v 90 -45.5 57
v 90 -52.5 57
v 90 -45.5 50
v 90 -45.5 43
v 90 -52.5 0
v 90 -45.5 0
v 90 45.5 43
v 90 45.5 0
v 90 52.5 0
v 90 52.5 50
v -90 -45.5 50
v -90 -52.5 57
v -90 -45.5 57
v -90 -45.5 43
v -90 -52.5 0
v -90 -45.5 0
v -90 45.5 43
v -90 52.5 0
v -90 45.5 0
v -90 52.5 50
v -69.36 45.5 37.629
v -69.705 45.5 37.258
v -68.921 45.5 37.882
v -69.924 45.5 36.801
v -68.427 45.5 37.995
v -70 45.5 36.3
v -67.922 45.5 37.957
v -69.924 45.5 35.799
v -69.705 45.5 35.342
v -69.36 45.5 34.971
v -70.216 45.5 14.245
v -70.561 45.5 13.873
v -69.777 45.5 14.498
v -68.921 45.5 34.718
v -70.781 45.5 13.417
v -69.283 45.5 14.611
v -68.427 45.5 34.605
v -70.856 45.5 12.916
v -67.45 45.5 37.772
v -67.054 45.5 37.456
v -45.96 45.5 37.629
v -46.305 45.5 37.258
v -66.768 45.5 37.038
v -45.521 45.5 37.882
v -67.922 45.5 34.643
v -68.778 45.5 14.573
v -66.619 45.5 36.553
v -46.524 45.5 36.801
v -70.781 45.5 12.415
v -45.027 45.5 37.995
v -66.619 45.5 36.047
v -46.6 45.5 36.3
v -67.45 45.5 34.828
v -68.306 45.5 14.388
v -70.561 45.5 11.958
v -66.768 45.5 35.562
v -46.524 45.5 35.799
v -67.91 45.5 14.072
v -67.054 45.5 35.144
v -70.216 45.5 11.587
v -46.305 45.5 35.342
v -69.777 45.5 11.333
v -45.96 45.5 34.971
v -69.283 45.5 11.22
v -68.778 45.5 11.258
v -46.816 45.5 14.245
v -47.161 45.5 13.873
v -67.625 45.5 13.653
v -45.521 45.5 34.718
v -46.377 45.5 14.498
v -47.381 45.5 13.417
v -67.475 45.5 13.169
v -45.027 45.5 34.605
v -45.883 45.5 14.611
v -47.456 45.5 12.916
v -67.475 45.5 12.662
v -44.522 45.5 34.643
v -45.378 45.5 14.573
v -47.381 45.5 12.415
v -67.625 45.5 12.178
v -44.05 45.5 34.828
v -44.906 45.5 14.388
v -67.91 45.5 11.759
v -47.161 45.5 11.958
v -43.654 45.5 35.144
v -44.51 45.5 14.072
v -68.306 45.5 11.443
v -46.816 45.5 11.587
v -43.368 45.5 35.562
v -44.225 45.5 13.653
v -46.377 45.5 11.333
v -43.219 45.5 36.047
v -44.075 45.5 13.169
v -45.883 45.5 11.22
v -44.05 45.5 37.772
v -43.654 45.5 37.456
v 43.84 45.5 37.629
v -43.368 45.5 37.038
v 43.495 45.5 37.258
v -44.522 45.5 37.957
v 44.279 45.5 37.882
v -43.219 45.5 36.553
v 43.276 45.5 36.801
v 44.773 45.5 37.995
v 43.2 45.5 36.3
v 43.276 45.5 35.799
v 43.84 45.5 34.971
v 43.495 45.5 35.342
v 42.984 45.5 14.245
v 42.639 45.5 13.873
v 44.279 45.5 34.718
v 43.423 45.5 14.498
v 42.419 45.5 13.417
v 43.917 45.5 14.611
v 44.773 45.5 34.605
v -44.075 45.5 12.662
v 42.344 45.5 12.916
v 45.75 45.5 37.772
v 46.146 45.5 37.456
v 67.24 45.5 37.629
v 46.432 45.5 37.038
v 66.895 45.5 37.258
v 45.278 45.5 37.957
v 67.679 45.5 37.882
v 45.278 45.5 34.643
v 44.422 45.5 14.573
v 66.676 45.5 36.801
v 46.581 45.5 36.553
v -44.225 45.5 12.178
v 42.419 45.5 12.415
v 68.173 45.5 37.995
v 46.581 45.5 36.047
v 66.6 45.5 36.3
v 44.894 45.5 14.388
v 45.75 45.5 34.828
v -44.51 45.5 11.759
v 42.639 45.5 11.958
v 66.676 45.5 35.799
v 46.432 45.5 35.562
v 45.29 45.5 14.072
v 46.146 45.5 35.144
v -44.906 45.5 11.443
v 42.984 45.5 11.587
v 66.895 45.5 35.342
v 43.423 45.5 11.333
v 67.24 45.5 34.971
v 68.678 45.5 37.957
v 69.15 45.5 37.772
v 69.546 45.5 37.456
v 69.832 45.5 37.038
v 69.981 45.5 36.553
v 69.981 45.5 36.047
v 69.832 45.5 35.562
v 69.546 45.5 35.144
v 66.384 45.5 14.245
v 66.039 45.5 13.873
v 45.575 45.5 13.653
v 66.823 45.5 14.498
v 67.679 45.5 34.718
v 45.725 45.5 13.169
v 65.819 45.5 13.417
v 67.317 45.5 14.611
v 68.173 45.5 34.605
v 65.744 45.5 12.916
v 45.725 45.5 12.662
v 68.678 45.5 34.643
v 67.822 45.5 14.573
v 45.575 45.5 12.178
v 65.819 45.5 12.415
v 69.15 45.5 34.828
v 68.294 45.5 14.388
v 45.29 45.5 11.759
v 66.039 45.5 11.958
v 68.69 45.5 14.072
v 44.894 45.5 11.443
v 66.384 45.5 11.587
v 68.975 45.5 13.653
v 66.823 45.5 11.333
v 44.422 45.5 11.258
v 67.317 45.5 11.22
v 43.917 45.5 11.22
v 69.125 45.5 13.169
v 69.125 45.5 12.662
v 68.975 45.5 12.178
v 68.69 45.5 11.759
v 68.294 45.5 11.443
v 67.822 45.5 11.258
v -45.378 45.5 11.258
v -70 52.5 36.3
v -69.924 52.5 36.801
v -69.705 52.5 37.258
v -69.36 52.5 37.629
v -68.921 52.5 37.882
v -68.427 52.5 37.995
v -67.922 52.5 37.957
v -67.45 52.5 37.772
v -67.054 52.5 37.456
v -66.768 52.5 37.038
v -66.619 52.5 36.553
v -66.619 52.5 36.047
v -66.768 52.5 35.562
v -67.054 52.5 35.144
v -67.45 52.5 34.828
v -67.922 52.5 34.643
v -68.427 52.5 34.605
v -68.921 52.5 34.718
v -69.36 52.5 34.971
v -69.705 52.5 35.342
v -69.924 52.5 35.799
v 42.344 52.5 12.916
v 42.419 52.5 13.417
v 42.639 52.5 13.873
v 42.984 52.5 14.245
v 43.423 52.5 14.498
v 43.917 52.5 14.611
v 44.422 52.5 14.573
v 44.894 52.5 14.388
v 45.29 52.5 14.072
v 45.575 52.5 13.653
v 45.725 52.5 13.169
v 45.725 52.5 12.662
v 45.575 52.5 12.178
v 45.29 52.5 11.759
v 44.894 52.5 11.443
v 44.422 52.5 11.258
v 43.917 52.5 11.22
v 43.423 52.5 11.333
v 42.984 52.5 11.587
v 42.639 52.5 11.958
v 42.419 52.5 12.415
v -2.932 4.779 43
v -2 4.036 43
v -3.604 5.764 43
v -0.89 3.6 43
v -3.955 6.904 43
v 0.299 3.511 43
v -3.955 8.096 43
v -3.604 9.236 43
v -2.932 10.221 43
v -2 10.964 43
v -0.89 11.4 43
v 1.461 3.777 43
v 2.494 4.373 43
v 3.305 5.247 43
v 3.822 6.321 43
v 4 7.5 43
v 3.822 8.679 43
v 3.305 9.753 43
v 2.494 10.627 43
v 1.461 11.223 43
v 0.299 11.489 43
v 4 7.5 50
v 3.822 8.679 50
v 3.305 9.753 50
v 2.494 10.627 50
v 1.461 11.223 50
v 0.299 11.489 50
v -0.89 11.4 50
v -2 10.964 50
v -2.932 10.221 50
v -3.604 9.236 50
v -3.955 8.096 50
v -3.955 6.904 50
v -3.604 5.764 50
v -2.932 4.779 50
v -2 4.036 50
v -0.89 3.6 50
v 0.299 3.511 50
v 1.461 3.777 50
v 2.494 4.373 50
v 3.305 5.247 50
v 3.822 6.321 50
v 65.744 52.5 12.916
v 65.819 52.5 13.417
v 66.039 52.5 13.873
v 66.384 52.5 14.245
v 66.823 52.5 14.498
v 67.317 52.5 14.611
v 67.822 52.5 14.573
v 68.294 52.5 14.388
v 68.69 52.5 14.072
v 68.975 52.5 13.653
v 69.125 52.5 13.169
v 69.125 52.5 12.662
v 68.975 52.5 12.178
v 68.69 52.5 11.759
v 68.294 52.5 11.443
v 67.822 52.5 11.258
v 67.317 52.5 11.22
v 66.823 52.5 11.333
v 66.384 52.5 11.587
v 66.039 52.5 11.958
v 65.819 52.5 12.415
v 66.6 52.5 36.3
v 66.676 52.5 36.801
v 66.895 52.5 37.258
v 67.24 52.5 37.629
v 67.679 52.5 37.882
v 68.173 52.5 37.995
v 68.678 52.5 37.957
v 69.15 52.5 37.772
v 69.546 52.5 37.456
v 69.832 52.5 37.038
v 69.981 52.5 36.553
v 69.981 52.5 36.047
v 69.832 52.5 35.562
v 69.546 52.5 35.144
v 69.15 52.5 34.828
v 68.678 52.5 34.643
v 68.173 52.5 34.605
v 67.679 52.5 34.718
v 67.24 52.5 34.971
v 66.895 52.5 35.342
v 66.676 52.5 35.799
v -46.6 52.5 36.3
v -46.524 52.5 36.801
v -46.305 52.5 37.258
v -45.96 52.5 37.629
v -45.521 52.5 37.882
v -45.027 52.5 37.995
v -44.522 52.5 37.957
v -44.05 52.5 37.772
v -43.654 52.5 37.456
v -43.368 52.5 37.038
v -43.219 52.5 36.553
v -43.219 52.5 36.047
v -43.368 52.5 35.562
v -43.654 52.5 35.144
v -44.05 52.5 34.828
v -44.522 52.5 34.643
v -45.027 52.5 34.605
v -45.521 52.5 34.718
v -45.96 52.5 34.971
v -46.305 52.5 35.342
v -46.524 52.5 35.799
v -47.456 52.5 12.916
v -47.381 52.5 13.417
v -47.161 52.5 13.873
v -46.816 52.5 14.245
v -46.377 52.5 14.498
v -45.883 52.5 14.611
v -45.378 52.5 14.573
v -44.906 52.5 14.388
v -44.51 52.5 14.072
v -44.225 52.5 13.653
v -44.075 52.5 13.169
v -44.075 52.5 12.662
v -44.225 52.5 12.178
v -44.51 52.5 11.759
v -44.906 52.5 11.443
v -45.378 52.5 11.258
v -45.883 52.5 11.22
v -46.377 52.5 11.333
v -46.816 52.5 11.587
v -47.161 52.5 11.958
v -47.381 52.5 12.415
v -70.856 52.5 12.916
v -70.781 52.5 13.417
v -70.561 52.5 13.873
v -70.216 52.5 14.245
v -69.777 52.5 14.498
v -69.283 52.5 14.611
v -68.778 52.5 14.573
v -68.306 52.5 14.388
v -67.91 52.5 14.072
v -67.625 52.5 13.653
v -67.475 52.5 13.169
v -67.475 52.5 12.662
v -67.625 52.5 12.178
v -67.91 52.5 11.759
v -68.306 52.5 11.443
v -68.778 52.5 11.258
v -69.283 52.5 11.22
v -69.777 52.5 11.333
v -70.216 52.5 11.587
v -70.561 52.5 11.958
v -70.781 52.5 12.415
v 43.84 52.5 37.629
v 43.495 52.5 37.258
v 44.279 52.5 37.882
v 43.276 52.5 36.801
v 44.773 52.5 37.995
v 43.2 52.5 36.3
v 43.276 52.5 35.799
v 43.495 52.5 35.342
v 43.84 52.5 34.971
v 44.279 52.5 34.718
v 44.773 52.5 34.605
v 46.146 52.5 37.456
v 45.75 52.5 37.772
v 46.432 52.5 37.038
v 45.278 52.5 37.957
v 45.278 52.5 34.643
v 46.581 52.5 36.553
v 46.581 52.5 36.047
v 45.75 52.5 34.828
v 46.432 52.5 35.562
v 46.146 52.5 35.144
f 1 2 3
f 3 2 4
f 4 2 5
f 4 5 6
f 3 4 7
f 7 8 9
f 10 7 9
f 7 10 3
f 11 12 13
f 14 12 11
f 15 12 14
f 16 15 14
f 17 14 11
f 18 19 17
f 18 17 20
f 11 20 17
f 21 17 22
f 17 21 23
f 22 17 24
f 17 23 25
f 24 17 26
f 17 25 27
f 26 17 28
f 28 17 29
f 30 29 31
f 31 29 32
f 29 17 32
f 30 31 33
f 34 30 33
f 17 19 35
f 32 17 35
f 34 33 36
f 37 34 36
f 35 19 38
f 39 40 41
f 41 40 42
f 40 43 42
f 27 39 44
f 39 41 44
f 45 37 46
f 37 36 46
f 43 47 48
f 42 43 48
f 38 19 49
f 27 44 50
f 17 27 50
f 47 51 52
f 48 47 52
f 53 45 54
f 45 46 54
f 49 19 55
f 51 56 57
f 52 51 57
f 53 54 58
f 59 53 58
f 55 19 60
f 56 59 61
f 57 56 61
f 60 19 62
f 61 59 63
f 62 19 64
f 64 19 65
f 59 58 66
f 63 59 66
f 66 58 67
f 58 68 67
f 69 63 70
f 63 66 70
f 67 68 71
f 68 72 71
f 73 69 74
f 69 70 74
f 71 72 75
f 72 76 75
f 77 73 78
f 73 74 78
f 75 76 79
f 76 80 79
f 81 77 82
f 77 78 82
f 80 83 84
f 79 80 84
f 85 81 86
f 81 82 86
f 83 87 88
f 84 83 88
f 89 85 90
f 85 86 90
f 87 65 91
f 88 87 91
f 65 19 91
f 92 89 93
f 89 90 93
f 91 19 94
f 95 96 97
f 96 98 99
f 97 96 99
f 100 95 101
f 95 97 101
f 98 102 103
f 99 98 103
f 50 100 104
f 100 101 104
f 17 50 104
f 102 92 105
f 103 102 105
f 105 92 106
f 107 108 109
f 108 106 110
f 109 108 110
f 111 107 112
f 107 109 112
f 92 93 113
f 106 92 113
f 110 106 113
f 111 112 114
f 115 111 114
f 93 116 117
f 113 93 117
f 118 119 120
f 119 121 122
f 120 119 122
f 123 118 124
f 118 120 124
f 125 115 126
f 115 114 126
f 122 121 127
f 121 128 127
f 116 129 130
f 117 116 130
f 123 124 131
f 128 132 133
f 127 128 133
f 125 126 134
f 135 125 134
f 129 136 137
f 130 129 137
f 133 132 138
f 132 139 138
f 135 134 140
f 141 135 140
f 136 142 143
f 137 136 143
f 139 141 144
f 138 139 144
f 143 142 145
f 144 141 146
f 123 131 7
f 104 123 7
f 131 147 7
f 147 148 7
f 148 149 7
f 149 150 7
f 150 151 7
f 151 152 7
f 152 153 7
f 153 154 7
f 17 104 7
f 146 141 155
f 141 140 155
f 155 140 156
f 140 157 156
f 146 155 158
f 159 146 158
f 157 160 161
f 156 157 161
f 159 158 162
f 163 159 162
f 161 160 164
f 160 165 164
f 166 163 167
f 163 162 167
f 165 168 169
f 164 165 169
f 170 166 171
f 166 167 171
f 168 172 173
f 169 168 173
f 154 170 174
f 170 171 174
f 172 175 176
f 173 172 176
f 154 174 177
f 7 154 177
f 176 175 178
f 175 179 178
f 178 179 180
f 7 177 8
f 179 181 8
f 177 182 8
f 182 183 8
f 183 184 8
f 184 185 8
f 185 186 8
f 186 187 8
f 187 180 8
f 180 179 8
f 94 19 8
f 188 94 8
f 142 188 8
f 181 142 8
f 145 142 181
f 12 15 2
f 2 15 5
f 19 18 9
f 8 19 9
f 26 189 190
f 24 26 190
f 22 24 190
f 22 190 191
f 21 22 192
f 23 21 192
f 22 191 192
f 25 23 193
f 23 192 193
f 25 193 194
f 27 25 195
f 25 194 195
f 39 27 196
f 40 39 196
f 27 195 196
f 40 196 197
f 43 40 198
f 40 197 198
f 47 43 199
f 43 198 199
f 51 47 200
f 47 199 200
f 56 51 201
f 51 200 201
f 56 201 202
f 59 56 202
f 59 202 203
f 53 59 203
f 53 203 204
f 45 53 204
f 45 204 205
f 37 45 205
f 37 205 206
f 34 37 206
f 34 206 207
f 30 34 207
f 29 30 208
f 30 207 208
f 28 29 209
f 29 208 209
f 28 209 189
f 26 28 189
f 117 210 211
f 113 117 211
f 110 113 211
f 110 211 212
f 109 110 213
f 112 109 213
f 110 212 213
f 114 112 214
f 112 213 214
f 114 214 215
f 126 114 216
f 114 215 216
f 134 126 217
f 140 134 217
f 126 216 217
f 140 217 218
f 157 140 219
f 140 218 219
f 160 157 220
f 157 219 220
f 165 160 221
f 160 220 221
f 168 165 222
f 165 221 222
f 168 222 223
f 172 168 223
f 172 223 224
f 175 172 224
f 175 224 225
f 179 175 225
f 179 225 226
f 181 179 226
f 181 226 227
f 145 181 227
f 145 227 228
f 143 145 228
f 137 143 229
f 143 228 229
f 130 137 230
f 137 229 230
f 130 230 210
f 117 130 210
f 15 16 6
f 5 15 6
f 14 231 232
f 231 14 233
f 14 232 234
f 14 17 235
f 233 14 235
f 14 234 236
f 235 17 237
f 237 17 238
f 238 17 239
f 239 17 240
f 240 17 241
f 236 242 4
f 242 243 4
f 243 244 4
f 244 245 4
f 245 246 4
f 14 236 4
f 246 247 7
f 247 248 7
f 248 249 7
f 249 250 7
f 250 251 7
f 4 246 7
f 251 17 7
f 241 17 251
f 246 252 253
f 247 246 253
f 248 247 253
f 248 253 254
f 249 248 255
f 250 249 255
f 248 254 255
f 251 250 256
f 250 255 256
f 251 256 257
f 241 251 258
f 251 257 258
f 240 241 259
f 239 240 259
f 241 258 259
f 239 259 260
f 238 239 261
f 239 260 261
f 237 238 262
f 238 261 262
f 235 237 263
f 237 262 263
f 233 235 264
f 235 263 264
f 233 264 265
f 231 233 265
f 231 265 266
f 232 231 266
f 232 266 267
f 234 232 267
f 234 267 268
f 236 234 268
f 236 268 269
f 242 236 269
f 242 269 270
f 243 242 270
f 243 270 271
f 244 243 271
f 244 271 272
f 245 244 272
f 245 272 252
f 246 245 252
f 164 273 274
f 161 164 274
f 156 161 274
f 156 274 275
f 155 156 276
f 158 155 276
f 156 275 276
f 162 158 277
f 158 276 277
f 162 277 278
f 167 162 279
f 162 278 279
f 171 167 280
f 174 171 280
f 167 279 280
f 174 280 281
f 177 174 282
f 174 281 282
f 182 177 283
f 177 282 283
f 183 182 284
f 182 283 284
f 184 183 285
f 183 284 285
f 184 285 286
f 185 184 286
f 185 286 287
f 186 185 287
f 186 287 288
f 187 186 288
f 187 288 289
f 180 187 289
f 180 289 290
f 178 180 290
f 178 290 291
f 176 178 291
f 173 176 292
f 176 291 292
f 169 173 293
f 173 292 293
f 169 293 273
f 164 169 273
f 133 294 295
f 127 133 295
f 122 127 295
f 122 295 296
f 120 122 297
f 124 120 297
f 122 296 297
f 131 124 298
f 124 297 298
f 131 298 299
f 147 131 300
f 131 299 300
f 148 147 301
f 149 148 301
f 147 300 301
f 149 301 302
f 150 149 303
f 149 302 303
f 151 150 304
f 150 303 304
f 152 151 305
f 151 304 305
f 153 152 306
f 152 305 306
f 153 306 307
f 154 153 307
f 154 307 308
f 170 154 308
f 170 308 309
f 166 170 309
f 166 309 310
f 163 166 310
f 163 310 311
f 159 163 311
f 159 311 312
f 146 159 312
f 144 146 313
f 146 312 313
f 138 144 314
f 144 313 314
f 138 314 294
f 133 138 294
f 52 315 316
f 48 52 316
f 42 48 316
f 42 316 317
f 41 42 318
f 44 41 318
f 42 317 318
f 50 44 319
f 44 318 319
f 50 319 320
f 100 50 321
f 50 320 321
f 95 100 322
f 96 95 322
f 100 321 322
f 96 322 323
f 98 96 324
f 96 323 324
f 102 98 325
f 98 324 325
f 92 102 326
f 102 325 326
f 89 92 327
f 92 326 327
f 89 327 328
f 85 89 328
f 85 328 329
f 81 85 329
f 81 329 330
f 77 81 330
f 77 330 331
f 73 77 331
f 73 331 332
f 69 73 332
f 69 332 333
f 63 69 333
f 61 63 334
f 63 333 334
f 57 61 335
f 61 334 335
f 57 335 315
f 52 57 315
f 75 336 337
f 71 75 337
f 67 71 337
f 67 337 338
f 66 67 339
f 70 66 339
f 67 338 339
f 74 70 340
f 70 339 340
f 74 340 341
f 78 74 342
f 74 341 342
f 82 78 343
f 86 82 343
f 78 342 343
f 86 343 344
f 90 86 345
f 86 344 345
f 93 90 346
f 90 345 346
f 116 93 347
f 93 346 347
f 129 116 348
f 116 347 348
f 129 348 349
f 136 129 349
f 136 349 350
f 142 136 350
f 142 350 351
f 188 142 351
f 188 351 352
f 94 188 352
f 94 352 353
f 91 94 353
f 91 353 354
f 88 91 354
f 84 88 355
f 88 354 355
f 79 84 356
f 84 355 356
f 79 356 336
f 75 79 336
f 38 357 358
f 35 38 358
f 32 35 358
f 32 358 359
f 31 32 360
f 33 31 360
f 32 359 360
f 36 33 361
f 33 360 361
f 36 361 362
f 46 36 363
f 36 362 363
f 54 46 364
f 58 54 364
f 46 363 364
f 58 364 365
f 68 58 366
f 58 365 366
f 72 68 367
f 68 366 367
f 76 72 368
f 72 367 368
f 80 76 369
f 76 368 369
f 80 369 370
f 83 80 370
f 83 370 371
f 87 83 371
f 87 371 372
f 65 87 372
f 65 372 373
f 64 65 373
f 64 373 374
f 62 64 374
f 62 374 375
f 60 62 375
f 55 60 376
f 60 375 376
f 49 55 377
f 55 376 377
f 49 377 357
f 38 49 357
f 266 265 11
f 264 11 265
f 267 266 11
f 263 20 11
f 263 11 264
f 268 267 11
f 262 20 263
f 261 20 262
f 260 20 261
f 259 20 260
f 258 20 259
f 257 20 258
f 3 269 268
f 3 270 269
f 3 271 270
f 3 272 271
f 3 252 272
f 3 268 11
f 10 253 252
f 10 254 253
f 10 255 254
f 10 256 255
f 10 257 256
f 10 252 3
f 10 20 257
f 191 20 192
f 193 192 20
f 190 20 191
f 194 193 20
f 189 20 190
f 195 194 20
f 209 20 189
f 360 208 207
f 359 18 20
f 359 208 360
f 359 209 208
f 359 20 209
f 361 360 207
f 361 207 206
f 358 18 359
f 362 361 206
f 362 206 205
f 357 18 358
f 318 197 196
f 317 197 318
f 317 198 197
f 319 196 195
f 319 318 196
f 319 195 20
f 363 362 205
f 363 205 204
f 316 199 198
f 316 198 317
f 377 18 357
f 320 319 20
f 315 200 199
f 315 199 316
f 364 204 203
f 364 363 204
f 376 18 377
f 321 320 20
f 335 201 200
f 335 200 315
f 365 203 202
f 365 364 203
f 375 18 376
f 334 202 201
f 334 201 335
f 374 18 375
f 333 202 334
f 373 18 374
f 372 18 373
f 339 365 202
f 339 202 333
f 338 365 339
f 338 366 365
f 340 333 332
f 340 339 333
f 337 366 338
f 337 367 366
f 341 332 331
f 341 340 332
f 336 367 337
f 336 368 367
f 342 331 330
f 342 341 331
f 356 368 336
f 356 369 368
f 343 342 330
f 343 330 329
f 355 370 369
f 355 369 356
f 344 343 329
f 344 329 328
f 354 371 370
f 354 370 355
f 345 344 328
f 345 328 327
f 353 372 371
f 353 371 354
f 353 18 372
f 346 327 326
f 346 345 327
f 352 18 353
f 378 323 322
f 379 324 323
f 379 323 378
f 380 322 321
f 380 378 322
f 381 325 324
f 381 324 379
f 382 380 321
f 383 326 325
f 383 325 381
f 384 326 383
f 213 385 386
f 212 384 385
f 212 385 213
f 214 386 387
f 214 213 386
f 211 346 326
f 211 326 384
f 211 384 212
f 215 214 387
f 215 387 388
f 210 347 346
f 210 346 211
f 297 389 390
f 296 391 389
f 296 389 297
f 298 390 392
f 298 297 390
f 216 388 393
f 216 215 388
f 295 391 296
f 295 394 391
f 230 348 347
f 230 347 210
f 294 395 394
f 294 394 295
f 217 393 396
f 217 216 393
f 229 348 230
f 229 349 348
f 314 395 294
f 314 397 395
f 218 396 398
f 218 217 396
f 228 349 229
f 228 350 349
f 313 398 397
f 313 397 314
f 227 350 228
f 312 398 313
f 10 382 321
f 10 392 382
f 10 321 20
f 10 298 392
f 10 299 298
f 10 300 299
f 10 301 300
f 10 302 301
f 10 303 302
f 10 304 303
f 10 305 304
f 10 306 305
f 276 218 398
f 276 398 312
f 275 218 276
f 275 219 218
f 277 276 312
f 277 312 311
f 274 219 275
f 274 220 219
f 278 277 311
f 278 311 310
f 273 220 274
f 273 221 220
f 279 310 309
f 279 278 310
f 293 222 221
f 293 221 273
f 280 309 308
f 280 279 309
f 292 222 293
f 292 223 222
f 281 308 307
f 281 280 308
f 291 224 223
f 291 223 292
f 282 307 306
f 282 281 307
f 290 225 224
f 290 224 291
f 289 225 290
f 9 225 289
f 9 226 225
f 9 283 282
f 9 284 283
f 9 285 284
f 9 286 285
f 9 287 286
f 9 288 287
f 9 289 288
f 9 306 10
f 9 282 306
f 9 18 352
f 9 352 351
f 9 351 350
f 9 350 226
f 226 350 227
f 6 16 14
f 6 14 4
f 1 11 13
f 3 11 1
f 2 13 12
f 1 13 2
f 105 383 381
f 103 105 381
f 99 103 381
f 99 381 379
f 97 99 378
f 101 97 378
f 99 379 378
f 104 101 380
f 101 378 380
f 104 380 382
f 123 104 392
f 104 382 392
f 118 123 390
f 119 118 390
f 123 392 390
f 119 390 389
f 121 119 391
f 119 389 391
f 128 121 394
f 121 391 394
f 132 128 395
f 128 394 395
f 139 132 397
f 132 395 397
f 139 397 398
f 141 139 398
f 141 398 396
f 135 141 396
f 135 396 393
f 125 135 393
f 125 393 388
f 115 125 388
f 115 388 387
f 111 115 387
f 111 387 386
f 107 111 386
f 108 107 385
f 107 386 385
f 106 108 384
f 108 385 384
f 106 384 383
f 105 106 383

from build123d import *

# Parameters (mm, degrees)
F0_W          = 180
F0_H          = 105
F1_DEPTH      = 50
F2_W          = 180
F2_H          = 91
F3_DEPTH      = 1
F3_DEPTH_BACK = 43
F4_R          = 4
F5_DEPTH      = 50.001
F6_W          = 180
F6_H          = 7
F7_DEPTH      = 7
F8_R          = 1.7
F9_DEPTH      = 7


with BuildPart() as f1:
    # F0 (on Top) → F1 (new body)
    with BuildSketch(Plane.XY):
        Rectangle(F0_W, F0_H)
    extrude(amount=F1_DEPTH)

    # F2 (on face) → F3 (cut, two sides)
    with BuildSketch(Plane.XY) as f3_sk:
        Rectangle(F2_W, F2_H)
    extrude(amount=-F3_DEPTH, mode=Mode.SUBTRACT)
    extrude(f3_sk.sketch, amount=F3_DEPTH_BACK, mode=Mode.SUBTRACT)

    # F4 (on face) → F5 (cut, through all)
    with BuildSketch(Plane.XY.offset(50)):
        with Locations((0, 7.5)):
            Circle(F4_R)
    extrude(amount=-F5_DEPTH, mode=Mode.SUBTRACT)

    # F6 (on face) → F7 (join)
    with BuildSketch(Plane.XY.offset(50)):
        with Locations((0, -49)):
            Rectangle(F6_W, F6_H)
    extrude(amount=F7_DEPTH)

    # F8 (on face) → F9 (cut, through all)
    with BuildSketch(Plane(origin=(0, 52.5, 0), x_dir=(-1, 0, 0), z_dir=(0, 1, 0))):
        with Locations((-68.3, 36.3)):
            Circle(F8_R)
        with Locations((-67.4438270785, 12.9156683241)):
            Circle(F8_R)
        with Locations((-44.9, 36.3)):
            Circle(F8_R)
        with Locations((-44.0438270785, 12.9156683241)):
            Circle(F8_R)
        with Locations((44.9, 36.3)):
            Circle(F8_R)
        with Locations((45.7561729215, 12.9156683241)):
            Circle(F8_R)
        with Locations((68.3, 36.3)):
            Circle(F8_R)
        with Locations((69.1561729215, 12.9156683241)):
            Circle(F8_R)
    extrude(amount=-F9_DEPTH, mode=Mode.SUBTRACT)


solid = f1.part
